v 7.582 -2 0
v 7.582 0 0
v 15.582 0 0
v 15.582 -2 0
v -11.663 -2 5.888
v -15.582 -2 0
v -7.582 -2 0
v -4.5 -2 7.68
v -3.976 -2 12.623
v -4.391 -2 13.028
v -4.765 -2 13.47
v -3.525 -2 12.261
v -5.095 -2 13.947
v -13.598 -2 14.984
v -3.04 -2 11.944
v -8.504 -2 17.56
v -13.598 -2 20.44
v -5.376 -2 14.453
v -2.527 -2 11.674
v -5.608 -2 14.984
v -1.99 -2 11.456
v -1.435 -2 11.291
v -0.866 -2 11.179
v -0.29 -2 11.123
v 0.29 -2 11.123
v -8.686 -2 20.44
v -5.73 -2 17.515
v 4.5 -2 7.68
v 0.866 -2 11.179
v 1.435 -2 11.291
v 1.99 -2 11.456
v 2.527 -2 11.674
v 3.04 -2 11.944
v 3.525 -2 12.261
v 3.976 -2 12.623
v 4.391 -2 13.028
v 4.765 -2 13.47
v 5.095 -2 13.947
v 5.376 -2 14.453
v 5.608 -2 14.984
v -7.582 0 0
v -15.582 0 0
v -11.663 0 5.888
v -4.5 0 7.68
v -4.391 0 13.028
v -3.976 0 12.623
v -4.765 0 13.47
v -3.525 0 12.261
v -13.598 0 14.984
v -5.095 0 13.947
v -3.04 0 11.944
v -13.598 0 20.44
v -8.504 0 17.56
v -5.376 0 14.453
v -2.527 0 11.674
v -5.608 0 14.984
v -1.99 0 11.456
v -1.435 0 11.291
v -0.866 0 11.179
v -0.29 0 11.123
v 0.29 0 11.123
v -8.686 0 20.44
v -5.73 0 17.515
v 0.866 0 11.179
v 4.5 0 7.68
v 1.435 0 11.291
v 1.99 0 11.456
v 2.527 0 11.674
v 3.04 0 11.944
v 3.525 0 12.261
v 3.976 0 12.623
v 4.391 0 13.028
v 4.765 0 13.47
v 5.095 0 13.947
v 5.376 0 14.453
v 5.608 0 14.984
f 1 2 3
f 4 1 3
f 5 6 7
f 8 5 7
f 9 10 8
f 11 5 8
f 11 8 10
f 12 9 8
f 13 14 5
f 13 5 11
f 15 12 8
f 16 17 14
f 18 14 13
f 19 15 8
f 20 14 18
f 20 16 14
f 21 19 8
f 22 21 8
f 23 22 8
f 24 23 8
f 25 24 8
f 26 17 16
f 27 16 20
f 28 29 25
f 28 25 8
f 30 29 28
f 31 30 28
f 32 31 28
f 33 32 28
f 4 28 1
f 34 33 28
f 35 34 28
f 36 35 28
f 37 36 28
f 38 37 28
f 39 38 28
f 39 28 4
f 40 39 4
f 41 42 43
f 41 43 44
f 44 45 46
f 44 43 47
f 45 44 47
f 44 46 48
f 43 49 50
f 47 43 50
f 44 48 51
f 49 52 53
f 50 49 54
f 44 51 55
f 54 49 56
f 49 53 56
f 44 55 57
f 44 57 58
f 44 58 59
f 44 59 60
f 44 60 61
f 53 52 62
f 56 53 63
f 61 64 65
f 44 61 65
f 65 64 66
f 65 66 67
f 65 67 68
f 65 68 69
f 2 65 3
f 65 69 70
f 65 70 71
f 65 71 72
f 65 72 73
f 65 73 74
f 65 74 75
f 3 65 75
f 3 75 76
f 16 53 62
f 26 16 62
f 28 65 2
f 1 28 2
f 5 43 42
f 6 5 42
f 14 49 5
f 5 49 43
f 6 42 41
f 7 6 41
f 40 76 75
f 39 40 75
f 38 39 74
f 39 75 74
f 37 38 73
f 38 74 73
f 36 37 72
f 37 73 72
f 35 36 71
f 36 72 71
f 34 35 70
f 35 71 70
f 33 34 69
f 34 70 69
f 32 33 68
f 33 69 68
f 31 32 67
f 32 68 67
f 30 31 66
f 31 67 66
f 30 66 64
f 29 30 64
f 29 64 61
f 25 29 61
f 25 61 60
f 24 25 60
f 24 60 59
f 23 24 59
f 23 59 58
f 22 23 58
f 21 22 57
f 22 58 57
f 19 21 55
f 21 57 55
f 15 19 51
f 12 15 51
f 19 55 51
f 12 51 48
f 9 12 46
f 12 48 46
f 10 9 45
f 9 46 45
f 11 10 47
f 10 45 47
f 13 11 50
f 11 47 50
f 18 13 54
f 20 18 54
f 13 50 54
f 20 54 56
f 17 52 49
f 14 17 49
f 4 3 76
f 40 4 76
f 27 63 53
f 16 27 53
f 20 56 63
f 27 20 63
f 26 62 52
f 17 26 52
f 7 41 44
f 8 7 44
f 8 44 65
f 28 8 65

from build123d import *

# Parameters (mm, degrees)
F1_DEPTH = 2


with BuildPart() as f1:
    # F0 (on Front) → F1 (new body)
    with BuildSketch(Plane.XZ):
        with BuildLine():
            Line((7.582128, 0), (15.582128, 0))
            Line((15.582128, 0), (5.60828, 14.98407))
            ThreePointArc((5.60828, 14.98407), (0, 11.116486), (-5.60828, 14.98407))
            Line((-5.60828, 14.98407), (-11.662617, 5.888422))
            Line((-11.662617, 5.888422), (-15.582128, 0))
            Line((-15.582128, 0), (-7.582128, 0))
            Line((-7.582128, 0), (-4.5, 7.679838))
            Line((-4.5, 7.679838), (4.5, 7.679838))
            Line((4.5, 7.679838), (7.582128, 0))
        make_face()
        Polygon((-11.662617, 5.888422), (-5.60828, 14.98407), (-5.730158, 17.515007), (-8.504199, 17.560361), (-8.686104, 20.440266), (-13.597518, 20.440266), (-13.597518, 14.98407), align=None)
    extrude(amount=F1_DEPTH)


solid = f1.part
